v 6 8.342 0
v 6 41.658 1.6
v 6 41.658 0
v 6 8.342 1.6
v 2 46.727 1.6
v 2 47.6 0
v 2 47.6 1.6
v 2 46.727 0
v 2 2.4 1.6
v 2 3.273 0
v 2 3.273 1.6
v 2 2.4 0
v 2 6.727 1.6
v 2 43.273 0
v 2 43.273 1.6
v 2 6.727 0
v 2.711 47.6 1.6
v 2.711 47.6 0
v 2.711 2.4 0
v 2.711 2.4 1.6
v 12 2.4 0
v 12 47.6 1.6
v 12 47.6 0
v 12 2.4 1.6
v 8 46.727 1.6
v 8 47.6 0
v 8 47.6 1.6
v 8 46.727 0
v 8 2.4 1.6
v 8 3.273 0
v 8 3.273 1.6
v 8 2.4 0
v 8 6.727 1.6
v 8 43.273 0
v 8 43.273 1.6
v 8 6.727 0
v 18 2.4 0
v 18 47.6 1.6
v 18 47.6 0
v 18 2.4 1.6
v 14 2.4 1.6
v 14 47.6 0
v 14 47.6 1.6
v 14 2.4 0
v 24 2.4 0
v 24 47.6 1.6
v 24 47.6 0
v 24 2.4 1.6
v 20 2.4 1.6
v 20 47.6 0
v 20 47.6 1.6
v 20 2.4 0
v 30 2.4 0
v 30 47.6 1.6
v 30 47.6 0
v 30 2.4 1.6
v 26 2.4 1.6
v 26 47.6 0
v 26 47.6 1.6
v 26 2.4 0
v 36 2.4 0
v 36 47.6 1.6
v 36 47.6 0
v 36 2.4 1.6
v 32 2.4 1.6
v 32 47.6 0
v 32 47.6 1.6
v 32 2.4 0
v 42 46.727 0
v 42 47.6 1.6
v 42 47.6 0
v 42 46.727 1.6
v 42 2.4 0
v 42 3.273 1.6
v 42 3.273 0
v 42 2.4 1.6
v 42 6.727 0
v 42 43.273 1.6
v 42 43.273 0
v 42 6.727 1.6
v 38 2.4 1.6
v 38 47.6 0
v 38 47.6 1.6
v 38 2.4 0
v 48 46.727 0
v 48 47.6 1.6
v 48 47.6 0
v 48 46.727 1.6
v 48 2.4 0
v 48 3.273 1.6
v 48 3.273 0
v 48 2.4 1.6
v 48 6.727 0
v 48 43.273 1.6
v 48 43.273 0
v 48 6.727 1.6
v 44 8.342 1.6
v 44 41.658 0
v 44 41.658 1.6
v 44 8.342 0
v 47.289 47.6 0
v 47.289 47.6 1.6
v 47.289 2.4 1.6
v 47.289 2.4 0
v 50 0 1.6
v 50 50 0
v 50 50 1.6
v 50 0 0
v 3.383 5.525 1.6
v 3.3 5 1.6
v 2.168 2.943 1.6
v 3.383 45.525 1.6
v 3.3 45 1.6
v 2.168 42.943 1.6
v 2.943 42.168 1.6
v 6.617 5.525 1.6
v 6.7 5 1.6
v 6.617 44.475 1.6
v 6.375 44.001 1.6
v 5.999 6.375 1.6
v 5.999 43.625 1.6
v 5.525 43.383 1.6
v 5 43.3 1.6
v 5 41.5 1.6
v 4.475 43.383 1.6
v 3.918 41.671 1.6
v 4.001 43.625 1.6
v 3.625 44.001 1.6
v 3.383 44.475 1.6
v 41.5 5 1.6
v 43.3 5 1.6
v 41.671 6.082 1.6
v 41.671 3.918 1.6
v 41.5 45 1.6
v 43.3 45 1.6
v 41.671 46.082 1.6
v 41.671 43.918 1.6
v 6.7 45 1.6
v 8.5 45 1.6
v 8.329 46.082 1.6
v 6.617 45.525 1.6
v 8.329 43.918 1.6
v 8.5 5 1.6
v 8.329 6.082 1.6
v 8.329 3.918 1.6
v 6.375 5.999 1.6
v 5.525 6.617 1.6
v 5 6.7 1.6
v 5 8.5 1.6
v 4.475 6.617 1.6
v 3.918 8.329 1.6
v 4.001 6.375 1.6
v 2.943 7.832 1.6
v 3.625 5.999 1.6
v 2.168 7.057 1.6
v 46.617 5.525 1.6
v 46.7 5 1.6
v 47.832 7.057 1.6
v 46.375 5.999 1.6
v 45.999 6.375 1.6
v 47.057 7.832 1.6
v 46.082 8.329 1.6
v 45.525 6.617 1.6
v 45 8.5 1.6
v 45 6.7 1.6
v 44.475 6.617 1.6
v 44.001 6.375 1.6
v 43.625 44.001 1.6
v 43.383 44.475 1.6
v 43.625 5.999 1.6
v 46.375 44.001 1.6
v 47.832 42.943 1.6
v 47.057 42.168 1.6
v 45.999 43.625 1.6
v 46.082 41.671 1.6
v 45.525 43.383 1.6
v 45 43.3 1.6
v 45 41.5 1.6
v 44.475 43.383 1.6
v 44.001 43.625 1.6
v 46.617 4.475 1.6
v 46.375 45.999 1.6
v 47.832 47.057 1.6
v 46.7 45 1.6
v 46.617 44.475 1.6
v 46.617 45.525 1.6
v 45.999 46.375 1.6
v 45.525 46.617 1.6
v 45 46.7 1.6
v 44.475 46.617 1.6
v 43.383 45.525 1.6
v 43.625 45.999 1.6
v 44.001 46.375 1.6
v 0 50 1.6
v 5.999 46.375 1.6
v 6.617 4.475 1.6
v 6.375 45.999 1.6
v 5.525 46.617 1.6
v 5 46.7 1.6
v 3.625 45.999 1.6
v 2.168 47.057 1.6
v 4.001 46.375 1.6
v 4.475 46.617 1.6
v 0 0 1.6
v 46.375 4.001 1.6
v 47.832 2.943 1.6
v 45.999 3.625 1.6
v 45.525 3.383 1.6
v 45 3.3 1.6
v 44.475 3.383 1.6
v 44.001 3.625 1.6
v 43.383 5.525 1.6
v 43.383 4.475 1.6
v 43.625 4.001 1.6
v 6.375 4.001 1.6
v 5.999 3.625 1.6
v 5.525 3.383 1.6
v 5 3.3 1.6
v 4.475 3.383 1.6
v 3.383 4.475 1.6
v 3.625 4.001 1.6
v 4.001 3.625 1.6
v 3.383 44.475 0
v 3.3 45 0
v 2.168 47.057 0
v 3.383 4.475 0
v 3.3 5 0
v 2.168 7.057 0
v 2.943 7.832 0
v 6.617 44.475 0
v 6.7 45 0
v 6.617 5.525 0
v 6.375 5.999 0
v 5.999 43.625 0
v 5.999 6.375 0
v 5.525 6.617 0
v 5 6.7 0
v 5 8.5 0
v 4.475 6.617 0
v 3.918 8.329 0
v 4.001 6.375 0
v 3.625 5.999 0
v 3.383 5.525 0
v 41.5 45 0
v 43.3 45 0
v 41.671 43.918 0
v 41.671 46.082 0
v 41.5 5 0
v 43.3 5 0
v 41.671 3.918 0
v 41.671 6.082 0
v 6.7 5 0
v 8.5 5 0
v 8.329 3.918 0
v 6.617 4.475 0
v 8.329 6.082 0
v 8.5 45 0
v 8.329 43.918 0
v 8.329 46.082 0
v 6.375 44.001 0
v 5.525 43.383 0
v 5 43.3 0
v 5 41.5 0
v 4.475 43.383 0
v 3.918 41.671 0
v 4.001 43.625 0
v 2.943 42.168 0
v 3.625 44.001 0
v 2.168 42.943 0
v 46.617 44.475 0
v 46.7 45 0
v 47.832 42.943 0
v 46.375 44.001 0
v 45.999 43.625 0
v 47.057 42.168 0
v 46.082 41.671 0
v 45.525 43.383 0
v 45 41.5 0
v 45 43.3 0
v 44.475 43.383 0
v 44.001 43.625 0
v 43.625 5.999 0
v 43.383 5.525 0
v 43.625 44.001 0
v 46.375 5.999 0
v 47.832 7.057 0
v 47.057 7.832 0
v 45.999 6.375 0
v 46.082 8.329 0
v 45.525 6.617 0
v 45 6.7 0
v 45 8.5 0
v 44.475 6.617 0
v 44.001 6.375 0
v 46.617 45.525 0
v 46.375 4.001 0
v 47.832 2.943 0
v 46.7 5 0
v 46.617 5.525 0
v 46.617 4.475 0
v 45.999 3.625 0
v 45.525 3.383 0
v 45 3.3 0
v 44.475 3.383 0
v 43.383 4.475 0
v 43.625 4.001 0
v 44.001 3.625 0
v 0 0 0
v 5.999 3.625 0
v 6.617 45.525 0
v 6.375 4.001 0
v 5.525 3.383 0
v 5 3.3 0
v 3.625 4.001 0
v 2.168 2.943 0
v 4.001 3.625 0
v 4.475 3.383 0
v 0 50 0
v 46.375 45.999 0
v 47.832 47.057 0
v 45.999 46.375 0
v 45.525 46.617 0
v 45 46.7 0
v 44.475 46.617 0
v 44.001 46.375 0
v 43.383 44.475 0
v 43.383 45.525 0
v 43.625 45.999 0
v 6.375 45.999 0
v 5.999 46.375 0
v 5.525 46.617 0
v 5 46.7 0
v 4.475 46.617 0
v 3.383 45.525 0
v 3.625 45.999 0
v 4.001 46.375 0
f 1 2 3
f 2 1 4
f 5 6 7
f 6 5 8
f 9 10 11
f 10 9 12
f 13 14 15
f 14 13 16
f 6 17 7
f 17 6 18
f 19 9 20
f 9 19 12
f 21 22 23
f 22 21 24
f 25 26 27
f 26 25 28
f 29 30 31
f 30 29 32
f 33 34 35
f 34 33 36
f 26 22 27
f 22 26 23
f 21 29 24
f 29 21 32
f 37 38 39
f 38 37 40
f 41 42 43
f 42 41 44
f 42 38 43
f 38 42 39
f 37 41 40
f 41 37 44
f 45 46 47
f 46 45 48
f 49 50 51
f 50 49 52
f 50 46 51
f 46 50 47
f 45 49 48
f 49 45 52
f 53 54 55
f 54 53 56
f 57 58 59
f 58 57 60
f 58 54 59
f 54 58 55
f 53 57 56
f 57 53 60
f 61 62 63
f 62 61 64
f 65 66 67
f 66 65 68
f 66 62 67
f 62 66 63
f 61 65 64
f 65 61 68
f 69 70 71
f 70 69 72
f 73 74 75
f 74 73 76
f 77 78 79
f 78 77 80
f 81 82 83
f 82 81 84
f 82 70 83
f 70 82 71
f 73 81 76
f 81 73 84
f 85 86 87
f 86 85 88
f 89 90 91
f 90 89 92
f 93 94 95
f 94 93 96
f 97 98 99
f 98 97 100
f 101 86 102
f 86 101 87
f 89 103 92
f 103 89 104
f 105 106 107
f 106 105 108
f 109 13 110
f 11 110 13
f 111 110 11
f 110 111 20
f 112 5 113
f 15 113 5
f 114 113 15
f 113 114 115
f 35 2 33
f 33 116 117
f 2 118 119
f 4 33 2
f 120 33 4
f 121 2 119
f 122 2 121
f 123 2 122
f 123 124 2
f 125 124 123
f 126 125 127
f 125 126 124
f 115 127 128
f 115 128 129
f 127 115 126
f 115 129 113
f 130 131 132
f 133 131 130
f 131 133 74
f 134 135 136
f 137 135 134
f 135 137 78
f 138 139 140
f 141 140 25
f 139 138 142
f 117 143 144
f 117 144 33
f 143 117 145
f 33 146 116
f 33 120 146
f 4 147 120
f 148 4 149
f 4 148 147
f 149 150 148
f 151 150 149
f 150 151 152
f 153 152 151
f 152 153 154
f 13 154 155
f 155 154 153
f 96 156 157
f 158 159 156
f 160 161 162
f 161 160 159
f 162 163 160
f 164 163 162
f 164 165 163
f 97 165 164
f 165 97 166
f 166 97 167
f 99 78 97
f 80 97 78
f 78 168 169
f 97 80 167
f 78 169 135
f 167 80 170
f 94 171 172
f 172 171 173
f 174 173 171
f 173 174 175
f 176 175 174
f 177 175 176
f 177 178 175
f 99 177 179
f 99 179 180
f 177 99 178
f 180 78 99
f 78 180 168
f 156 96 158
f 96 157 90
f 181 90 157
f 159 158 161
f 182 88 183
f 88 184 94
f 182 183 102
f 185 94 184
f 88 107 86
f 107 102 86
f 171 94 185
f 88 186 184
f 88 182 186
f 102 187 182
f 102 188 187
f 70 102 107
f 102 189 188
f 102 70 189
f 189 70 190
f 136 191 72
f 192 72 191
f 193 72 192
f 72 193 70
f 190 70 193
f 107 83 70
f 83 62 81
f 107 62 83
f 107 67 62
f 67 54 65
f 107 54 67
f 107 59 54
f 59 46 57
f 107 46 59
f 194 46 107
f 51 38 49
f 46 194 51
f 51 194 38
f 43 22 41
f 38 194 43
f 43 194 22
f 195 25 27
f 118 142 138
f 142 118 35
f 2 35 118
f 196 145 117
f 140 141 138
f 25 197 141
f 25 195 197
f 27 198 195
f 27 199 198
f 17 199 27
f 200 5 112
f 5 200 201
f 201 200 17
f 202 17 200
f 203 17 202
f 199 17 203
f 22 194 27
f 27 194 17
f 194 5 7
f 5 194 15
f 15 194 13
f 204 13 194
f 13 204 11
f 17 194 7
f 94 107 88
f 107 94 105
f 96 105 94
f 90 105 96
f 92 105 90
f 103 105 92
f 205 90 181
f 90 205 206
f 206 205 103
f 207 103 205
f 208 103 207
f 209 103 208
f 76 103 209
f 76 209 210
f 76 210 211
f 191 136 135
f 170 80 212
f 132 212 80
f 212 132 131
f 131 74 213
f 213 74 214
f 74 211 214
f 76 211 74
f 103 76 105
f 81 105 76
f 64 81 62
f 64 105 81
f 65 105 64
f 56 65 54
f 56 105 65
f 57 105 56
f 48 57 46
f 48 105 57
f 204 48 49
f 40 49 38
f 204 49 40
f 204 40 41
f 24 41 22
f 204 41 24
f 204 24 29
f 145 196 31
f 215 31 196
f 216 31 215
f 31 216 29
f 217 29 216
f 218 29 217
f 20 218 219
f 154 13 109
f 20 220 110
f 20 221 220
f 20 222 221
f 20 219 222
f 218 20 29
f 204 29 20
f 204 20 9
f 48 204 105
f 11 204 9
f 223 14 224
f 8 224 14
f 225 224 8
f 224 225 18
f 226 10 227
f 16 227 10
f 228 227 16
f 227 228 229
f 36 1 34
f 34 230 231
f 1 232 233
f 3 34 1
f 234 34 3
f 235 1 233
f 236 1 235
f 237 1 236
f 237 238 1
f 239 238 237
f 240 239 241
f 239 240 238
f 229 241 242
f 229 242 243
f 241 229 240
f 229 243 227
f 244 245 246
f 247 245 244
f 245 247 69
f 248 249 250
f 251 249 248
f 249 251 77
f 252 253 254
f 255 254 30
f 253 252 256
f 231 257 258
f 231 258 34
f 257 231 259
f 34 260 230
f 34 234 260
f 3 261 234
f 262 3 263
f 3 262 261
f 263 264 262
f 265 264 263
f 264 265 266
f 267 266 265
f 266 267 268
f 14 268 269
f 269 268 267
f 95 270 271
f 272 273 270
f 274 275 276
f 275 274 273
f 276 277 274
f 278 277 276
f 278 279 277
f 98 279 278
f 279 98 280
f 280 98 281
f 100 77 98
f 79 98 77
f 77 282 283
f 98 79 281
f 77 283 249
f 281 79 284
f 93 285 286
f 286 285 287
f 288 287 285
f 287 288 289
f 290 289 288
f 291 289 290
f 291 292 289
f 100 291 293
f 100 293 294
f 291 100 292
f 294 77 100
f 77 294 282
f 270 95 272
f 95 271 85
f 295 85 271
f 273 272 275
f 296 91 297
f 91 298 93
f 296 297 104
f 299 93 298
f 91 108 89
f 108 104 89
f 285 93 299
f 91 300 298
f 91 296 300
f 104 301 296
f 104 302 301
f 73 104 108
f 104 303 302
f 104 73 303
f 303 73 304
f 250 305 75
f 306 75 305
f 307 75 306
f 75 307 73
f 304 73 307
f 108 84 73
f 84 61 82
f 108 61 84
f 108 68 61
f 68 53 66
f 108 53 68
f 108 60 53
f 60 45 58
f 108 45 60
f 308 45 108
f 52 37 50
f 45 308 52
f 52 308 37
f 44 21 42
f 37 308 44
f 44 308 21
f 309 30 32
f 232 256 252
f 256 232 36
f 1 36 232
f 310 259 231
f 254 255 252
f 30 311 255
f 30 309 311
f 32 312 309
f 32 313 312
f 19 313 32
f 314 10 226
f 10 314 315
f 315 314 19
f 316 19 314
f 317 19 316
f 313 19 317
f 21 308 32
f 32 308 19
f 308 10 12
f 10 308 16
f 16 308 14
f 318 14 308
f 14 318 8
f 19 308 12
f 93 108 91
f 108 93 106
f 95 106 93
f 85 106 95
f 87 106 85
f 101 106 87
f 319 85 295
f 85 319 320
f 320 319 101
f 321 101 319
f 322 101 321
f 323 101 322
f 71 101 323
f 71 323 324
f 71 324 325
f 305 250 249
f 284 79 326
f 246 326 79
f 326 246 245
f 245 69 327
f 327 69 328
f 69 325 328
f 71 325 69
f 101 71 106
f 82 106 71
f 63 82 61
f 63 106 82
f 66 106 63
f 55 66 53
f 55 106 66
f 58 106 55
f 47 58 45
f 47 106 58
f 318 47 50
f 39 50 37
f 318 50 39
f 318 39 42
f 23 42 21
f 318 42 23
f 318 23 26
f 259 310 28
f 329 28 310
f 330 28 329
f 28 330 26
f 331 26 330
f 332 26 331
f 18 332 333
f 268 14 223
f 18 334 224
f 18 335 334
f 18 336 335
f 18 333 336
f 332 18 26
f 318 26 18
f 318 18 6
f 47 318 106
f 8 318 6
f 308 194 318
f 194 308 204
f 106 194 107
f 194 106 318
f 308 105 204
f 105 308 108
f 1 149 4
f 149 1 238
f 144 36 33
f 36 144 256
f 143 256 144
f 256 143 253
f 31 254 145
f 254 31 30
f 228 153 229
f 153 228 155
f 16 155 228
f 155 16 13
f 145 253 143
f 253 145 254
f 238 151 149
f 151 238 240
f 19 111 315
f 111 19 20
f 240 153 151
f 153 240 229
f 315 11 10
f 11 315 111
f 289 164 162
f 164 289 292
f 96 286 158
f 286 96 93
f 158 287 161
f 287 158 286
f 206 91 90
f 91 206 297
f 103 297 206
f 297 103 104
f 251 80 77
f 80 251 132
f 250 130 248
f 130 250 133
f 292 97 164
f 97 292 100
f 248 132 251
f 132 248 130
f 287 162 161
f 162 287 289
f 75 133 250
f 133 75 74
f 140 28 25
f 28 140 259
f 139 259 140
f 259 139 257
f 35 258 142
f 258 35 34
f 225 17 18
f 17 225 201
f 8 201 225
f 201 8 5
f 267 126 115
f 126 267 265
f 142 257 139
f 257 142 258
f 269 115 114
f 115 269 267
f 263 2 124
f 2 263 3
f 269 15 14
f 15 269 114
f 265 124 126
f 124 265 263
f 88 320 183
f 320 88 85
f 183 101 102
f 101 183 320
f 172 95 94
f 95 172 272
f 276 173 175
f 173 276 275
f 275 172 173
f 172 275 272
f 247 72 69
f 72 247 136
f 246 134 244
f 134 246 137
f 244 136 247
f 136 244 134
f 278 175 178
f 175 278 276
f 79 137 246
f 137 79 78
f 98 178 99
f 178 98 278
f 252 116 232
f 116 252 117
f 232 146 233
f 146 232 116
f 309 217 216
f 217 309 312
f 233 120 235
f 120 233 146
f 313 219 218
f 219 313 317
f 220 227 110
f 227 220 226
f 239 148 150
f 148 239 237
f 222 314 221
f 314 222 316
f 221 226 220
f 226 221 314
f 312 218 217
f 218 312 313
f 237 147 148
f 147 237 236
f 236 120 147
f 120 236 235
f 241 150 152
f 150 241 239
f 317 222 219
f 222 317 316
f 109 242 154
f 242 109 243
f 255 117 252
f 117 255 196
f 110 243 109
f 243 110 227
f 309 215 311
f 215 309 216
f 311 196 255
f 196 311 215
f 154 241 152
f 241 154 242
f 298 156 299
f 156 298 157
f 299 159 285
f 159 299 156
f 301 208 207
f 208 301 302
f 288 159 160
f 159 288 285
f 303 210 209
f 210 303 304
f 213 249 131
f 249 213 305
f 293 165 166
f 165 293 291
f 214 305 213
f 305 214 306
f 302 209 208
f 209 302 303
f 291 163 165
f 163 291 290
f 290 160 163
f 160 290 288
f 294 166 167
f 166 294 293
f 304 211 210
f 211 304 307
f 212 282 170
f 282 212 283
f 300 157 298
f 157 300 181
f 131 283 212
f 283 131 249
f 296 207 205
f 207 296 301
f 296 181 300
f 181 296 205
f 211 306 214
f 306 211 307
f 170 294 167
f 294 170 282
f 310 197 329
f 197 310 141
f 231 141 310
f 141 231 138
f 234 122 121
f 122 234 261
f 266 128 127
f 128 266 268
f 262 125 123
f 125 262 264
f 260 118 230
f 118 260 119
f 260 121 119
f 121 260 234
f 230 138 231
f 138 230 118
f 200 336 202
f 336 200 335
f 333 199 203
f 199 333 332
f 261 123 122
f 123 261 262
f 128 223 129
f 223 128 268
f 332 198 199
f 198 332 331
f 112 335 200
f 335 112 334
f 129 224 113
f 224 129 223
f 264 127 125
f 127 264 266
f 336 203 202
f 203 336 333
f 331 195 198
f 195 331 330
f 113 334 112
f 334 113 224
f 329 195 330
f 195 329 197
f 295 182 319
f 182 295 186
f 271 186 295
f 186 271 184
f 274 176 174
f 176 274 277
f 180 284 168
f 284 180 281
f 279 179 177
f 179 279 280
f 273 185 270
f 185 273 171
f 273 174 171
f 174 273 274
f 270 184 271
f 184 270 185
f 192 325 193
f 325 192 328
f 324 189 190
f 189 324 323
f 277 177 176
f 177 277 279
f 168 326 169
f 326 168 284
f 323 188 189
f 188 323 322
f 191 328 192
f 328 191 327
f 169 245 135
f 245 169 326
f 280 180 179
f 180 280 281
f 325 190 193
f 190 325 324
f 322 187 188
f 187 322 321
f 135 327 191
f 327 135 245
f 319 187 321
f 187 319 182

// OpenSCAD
fan_w = 50;
fan_h = 1.6;
n_slots = 8;
w_column = 2;
w_slot = ( fan_w - w_column ) / n_slots - w_column;
col_w = 2.4;
hole_d = 40;
hole_support_r = - ( hole_d - fan_w ) / 2 - 1.5;
hole_r = 1.7;

render( convexity = 10 ){
    difference(){
        union(){
            // Grid:
            difference(){
                cube( [ fan_w, fan_w, fan_h ] );
                for ( i = [ 0 : n_slots - 1 ] ){
                    translate( [ w_column + i * ( w_slot + w_column ), col_w, -1 ] )
                        cube( [ w_slot, fan_w - 2 * col_w,  fan_h + 2 ] );
                }
            }
            // Screw support:
            translate( [ - ( hole_d - fan_w ) / 2, - ( hole_d - fan_w ) / 2, 0 ] )
                    cylinder( h = fan_h,  r = hole_support_r, $fn = 20 );
            translate( [ hole_d - ( hole_d - fan_w ) / 2, -( hole_d - fan_w ) / 2, 0 ] )
                    cylinder( h = fan_h,  r = hole_support_r, $fn = 20 );
            translate( [ - ( hole_d - fan_w ) / 2, hole_d - ( hole_d - fan_w ) / 2, 0 ] )
                    cylinder( h = fan_h,  r = hole_support_r, $fn = 20 );
            translate( [ hole_d - ( hole_d - fan_w ) / 2, hole_d - ( hole_d - fan_w ) / 2, 0 ] )
                    cylinder( h = fan_h,  r = hole_support_r, $fn = 20 );
        }
        
        // Screw holes:
            translate( [ - ( hole_d - fan_w ) / 2, - ( hole_d - fan_w ) / 2, -1 ] )
                    cylinder( h = fan_h + 2,  r = hole_r, $fn = 20 );
            translate( [ hole_d - ( hole_d - fan_w ) / 2, -( hole_d - fan_w ) / 2, -1 ] )
                    cylinder( h = fan_h + 2,  r = hole_r, $fn = 20 );
            translate( [ - ( hole_d - fan_w ) / 2, hole_d - ( hole_d - fan_w ) / 2, -1 ] )
                    cylinder( h = fan_h + 2,  r = hole_r, $fn = 20 );
            translate( [ hole_d - ( hole_d - fan_w ) / 2, hole_d - ( hole_d - fan_w ) / 2, -1 ] )
                    cylinder( h = fan_h + 2,  r = hole_r, $fn = 20 );
    }
}
